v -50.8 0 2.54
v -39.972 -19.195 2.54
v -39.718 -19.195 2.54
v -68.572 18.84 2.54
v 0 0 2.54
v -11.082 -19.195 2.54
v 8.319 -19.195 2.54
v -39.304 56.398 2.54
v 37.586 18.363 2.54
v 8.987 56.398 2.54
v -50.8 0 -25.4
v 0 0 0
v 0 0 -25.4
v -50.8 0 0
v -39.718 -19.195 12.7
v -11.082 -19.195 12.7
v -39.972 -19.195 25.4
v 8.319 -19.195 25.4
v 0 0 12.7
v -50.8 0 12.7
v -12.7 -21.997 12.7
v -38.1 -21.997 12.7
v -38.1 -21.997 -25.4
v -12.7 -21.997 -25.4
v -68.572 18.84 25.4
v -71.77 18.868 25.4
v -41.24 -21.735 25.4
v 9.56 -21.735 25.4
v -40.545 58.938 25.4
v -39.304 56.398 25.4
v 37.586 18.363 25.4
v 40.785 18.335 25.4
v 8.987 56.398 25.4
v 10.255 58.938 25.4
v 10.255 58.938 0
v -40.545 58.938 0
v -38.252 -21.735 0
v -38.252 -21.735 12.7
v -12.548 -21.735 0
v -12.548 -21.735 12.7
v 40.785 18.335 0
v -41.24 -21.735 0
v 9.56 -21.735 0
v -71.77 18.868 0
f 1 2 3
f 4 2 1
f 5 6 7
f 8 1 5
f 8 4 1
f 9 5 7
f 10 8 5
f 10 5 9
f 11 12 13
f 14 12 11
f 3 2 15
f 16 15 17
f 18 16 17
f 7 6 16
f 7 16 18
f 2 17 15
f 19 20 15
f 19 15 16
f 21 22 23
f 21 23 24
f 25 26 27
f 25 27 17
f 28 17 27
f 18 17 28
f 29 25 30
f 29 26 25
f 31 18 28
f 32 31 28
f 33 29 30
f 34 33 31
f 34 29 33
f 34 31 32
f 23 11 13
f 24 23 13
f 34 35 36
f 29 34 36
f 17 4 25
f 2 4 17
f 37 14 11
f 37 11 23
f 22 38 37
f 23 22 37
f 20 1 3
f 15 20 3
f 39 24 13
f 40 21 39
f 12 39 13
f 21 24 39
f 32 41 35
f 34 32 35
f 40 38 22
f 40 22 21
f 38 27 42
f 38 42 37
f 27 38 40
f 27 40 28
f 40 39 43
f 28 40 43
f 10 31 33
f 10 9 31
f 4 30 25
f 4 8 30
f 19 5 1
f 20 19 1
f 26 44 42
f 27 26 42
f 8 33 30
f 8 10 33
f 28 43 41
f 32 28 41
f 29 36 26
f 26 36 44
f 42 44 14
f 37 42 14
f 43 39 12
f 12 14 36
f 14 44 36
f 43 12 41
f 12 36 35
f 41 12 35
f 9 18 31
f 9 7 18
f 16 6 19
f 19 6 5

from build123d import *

# Parameters (mm, degrees)
F1_DEPTH      = 25.4
F2_T          = -2.54
F8_DEPTH      = 12.7
F8_DEPTH_BACK = 25.4


# Not quite as in the source:
# - the program builds the solid bodies; features that only make, move or delete a surface that nothing else refers to are left out


with BuildPart() as f1:
    # F0 (on Top) → F1 (new body)
    with BuildSketch(Plane.XY):
        Polygon((10.2551429075, 58.9377772835), (-40.5448570925, 58.9377772835), (-71.7704754875, 18.8678289949), (-41.2404706852, -21.7346192906), (9.5595293148, -21.7346192906), (40.7851477097, 18.335328998), align=None)
    extrude(amount=F1_DEPTH)

    # F2
    f2_openings = [f1.faces().sort_by_distance(p)[0] for p in [
        (-15.492664, 18.601579, 25.4),
    ]]
    offset(amount=F2_T, openings=f2_openings)

    # F7 (on Top) → F8 (join, two sides)
    with BuildSketch(Plane.XY) as f8_sk:
        Polygon((0, 0), (-50.8, 0), (-38.1, -21.9970452561), (-12.7, -21.9970452561), align=None)
    extrude(amount=F8_DEPTH)
    extrude(f8_sk.sketch, amount=-F8_DEPTH_BACK)


solid = f1.part
